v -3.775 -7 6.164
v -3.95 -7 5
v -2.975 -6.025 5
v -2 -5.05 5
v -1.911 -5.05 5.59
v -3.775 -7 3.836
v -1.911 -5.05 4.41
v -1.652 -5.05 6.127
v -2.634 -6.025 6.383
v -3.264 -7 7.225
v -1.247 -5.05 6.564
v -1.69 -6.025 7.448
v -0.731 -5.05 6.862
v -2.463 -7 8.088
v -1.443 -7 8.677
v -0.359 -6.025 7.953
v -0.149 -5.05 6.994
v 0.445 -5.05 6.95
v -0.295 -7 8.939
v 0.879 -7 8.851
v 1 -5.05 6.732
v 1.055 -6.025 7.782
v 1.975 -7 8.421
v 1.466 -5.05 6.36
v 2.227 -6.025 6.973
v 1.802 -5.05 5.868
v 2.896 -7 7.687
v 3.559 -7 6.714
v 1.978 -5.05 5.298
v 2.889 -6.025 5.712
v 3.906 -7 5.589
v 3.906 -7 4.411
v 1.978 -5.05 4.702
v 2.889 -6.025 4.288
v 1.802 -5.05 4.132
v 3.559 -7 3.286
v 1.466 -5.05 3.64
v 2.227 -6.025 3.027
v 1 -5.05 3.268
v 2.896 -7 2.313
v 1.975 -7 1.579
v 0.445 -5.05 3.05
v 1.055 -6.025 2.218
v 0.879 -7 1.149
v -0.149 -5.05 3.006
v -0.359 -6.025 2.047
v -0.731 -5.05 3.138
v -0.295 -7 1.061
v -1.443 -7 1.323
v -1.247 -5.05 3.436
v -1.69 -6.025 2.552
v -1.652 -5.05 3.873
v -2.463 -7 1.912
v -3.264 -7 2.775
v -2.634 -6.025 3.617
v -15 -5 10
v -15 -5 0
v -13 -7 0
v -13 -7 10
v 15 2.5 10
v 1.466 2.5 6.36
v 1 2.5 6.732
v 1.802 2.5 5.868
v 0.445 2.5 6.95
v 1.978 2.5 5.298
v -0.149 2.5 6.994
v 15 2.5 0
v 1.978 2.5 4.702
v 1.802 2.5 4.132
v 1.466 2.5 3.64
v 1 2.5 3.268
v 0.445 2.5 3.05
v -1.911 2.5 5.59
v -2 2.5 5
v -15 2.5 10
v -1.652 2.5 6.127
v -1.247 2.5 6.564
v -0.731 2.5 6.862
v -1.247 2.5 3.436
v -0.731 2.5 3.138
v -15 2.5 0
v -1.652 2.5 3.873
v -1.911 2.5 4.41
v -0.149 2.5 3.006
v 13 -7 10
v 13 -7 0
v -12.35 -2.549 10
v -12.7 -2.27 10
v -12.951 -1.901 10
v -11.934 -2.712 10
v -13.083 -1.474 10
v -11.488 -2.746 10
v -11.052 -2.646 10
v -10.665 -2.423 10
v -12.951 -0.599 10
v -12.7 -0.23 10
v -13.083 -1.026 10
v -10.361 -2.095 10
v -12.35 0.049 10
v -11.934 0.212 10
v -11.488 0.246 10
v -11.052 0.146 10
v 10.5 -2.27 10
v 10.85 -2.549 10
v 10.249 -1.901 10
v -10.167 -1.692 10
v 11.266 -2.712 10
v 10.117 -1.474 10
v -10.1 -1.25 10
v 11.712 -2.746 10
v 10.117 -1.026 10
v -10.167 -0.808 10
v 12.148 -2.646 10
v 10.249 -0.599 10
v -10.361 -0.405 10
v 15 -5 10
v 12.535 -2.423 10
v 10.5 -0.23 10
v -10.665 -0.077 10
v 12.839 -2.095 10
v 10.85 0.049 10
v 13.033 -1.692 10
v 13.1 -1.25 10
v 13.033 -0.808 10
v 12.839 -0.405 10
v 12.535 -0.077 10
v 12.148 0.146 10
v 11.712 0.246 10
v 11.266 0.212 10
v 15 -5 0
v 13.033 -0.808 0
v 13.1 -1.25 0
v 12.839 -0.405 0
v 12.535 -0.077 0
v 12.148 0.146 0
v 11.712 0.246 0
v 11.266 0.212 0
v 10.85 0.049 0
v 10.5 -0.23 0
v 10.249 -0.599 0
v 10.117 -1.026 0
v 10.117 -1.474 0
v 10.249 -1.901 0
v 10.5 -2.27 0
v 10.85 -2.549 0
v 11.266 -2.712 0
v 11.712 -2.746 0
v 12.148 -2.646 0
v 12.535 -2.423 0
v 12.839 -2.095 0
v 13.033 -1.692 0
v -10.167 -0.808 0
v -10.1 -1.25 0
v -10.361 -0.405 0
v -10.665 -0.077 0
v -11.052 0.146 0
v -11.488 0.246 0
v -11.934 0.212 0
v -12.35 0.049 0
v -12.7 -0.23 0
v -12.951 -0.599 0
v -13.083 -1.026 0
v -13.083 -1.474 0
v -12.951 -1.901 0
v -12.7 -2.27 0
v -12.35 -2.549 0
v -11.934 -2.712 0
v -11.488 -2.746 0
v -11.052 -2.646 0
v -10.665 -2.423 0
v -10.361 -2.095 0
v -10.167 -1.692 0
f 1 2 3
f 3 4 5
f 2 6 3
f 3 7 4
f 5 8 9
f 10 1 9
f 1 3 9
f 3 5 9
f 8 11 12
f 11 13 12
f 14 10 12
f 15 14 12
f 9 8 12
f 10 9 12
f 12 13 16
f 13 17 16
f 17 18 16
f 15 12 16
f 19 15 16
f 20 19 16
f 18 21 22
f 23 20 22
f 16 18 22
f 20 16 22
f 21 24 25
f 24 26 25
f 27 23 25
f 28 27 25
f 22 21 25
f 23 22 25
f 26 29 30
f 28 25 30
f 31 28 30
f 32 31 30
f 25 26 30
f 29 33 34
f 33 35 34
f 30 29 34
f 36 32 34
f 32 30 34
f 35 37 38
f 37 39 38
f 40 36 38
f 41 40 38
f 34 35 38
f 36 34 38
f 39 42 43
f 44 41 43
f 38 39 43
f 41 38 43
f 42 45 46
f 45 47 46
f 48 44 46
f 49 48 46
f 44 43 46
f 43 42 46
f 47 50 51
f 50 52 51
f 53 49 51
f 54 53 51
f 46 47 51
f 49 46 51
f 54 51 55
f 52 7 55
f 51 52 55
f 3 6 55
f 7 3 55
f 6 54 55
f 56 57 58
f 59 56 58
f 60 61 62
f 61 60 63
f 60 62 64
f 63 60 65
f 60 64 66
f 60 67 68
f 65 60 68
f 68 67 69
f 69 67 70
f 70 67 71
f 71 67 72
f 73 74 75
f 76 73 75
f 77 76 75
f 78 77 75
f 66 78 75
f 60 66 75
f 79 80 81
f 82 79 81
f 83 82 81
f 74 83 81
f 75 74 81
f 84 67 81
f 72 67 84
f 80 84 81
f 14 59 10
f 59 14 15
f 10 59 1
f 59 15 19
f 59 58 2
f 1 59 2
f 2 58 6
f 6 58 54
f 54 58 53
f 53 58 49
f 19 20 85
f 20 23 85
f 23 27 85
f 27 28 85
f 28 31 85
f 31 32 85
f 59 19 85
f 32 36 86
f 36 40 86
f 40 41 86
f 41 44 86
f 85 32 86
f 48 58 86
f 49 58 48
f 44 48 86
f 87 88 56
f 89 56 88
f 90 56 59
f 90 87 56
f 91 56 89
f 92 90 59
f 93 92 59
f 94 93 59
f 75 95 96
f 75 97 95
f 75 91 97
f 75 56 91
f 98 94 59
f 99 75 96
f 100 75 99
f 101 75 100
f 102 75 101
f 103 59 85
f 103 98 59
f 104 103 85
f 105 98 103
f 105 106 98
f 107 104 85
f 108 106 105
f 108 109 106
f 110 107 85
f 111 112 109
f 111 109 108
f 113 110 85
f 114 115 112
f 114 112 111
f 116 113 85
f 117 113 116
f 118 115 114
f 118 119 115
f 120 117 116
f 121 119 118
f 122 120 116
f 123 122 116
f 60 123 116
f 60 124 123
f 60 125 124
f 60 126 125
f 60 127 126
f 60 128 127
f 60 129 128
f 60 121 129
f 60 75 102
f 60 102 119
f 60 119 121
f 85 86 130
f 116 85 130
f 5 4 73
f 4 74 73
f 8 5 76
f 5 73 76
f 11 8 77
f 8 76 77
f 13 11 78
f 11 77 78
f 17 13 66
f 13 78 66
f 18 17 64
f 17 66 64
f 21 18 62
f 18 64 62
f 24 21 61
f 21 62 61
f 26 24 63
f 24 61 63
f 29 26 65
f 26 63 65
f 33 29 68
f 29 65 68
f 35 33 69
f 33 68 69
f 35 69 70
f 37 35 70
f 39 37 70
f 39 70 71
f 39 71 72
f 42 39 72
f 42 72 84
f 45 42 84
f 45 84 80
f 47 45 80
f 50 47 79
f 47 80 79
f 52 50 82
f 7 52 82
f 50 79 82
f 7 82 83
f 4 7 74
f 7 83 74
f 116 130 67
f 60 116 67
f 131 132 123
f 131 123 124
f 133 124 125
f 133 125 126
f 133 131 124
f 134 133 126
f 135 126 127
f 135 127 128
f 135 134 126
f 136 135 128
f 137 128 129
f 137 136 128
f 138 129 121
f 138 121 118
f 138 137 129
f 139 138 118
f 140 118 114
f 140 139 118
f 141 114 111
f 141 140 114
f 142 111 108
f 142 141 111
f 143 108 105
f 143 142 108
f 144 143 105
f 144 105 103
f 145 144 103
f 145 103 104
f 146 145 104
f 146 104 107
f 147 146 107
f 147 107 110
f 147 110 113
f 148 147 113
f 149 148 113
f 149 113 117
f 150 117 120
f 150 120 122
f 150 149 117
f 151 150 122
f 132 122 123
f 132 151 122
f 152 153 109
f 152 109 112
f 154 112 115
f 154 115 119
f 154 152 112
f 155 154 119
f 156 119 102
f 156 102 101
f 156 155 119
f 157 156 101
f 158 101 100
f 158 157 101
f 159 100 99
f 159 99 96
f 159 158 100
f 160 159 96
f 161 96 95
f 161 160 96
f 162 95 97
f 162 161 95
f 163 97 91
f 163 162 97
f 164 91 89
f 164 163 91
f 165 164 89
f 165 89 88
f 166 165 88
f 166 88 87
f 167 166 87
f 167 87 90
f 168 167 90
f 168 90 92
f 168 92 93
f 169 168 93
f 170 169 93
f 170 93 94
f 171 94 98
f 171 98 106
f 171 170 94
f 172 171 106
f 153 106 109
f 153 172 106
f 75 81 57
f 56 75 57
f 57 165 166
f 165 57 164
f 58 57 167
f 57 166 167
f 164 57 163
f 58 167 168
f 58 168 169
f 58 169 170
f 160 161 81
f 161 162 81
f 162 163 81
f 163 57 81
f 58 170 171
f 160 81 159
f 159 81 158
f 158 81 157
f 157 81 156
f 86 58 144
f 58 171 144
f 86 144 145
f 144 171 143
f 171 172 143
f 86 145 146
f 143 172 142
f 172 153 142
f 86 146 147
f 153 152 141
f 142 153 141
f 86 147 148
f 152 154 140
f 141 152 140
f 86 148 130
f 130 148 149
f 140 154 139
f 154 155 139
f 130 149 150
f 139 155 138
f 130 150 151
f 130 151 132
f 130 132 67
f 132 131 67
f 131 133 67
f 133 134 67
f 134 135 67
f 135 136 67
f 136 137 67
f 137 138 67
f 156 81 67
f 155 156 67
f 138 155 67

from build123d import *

# Parameters (mm, degrees)
SKETCH1_R                     = 1.5
BOSS_EXTRUDE1_DEPTH           = 10
CSK_FOR_M4_SFHCS1_D           = 4
CSK_FOR_M4_SFHCS1_DEPTH       = 19
CSK_FOR_M4_SFHCS1_CSINK_D     = 7.9
CSK_FOR_M4_SFHCS1_CSINK_ANGLE = 90
CSK_FOR_M4_SFHCS1_TIP         = 1.201721238


with BuildPart() as part:
    # Sketch1 → Boss-Extrude1 (new body)
    with BuildSketch(Plane.XY):
        Polygon((-15, 2.5), (-15, -5), (-13, -7), (13, -7), (15, -5), (15, 2.5), align=None)
        with Locations((11.6, -1.25)):
            Circle(SKETCH1_R, mode=Mode.SUBTRACT)
        with Locations((-11.6, -1.25)):
            Circle(SKETCH1_R, mode=Mode.SUBTRACT)
    extrude(amount=BOSS_EXTRUDE1_DEPTH)

    # CSK for M4 SFHCS1
    with Locations(Plane(origin=(1278.247292614, -7, -931.083024415), x_dir=(1, 0, 0), z_dir=(0, -1, 0))):
        with Locations((-1278.247292614, 936.083024415)):
            CounterSinkHole(CSK_FOR_M4_SFHCS1_D / 2, CSK_FOR_M4_SFHCS1_CSINK_D / 2, depth=CSK_FOR_M4_SFHCS1_DEPTH, counter_sink_angle=CSK_FOR_M4_SFHCS1_CSINK_ANGLE)
            with Locations((0, 0, -(CSK_FOR_M4_SFHCS1_DEPTH + CSK_FOR_M4_SFHCS1_TIP / 2))):  # 118° drill point
                Cone(0, CSK_FOR_M4_SFHCS1_D / 2, CSK_FOR_M4_SFHCS1_TIP, mode=Mode.SUBTRACT)


solid = part.part
